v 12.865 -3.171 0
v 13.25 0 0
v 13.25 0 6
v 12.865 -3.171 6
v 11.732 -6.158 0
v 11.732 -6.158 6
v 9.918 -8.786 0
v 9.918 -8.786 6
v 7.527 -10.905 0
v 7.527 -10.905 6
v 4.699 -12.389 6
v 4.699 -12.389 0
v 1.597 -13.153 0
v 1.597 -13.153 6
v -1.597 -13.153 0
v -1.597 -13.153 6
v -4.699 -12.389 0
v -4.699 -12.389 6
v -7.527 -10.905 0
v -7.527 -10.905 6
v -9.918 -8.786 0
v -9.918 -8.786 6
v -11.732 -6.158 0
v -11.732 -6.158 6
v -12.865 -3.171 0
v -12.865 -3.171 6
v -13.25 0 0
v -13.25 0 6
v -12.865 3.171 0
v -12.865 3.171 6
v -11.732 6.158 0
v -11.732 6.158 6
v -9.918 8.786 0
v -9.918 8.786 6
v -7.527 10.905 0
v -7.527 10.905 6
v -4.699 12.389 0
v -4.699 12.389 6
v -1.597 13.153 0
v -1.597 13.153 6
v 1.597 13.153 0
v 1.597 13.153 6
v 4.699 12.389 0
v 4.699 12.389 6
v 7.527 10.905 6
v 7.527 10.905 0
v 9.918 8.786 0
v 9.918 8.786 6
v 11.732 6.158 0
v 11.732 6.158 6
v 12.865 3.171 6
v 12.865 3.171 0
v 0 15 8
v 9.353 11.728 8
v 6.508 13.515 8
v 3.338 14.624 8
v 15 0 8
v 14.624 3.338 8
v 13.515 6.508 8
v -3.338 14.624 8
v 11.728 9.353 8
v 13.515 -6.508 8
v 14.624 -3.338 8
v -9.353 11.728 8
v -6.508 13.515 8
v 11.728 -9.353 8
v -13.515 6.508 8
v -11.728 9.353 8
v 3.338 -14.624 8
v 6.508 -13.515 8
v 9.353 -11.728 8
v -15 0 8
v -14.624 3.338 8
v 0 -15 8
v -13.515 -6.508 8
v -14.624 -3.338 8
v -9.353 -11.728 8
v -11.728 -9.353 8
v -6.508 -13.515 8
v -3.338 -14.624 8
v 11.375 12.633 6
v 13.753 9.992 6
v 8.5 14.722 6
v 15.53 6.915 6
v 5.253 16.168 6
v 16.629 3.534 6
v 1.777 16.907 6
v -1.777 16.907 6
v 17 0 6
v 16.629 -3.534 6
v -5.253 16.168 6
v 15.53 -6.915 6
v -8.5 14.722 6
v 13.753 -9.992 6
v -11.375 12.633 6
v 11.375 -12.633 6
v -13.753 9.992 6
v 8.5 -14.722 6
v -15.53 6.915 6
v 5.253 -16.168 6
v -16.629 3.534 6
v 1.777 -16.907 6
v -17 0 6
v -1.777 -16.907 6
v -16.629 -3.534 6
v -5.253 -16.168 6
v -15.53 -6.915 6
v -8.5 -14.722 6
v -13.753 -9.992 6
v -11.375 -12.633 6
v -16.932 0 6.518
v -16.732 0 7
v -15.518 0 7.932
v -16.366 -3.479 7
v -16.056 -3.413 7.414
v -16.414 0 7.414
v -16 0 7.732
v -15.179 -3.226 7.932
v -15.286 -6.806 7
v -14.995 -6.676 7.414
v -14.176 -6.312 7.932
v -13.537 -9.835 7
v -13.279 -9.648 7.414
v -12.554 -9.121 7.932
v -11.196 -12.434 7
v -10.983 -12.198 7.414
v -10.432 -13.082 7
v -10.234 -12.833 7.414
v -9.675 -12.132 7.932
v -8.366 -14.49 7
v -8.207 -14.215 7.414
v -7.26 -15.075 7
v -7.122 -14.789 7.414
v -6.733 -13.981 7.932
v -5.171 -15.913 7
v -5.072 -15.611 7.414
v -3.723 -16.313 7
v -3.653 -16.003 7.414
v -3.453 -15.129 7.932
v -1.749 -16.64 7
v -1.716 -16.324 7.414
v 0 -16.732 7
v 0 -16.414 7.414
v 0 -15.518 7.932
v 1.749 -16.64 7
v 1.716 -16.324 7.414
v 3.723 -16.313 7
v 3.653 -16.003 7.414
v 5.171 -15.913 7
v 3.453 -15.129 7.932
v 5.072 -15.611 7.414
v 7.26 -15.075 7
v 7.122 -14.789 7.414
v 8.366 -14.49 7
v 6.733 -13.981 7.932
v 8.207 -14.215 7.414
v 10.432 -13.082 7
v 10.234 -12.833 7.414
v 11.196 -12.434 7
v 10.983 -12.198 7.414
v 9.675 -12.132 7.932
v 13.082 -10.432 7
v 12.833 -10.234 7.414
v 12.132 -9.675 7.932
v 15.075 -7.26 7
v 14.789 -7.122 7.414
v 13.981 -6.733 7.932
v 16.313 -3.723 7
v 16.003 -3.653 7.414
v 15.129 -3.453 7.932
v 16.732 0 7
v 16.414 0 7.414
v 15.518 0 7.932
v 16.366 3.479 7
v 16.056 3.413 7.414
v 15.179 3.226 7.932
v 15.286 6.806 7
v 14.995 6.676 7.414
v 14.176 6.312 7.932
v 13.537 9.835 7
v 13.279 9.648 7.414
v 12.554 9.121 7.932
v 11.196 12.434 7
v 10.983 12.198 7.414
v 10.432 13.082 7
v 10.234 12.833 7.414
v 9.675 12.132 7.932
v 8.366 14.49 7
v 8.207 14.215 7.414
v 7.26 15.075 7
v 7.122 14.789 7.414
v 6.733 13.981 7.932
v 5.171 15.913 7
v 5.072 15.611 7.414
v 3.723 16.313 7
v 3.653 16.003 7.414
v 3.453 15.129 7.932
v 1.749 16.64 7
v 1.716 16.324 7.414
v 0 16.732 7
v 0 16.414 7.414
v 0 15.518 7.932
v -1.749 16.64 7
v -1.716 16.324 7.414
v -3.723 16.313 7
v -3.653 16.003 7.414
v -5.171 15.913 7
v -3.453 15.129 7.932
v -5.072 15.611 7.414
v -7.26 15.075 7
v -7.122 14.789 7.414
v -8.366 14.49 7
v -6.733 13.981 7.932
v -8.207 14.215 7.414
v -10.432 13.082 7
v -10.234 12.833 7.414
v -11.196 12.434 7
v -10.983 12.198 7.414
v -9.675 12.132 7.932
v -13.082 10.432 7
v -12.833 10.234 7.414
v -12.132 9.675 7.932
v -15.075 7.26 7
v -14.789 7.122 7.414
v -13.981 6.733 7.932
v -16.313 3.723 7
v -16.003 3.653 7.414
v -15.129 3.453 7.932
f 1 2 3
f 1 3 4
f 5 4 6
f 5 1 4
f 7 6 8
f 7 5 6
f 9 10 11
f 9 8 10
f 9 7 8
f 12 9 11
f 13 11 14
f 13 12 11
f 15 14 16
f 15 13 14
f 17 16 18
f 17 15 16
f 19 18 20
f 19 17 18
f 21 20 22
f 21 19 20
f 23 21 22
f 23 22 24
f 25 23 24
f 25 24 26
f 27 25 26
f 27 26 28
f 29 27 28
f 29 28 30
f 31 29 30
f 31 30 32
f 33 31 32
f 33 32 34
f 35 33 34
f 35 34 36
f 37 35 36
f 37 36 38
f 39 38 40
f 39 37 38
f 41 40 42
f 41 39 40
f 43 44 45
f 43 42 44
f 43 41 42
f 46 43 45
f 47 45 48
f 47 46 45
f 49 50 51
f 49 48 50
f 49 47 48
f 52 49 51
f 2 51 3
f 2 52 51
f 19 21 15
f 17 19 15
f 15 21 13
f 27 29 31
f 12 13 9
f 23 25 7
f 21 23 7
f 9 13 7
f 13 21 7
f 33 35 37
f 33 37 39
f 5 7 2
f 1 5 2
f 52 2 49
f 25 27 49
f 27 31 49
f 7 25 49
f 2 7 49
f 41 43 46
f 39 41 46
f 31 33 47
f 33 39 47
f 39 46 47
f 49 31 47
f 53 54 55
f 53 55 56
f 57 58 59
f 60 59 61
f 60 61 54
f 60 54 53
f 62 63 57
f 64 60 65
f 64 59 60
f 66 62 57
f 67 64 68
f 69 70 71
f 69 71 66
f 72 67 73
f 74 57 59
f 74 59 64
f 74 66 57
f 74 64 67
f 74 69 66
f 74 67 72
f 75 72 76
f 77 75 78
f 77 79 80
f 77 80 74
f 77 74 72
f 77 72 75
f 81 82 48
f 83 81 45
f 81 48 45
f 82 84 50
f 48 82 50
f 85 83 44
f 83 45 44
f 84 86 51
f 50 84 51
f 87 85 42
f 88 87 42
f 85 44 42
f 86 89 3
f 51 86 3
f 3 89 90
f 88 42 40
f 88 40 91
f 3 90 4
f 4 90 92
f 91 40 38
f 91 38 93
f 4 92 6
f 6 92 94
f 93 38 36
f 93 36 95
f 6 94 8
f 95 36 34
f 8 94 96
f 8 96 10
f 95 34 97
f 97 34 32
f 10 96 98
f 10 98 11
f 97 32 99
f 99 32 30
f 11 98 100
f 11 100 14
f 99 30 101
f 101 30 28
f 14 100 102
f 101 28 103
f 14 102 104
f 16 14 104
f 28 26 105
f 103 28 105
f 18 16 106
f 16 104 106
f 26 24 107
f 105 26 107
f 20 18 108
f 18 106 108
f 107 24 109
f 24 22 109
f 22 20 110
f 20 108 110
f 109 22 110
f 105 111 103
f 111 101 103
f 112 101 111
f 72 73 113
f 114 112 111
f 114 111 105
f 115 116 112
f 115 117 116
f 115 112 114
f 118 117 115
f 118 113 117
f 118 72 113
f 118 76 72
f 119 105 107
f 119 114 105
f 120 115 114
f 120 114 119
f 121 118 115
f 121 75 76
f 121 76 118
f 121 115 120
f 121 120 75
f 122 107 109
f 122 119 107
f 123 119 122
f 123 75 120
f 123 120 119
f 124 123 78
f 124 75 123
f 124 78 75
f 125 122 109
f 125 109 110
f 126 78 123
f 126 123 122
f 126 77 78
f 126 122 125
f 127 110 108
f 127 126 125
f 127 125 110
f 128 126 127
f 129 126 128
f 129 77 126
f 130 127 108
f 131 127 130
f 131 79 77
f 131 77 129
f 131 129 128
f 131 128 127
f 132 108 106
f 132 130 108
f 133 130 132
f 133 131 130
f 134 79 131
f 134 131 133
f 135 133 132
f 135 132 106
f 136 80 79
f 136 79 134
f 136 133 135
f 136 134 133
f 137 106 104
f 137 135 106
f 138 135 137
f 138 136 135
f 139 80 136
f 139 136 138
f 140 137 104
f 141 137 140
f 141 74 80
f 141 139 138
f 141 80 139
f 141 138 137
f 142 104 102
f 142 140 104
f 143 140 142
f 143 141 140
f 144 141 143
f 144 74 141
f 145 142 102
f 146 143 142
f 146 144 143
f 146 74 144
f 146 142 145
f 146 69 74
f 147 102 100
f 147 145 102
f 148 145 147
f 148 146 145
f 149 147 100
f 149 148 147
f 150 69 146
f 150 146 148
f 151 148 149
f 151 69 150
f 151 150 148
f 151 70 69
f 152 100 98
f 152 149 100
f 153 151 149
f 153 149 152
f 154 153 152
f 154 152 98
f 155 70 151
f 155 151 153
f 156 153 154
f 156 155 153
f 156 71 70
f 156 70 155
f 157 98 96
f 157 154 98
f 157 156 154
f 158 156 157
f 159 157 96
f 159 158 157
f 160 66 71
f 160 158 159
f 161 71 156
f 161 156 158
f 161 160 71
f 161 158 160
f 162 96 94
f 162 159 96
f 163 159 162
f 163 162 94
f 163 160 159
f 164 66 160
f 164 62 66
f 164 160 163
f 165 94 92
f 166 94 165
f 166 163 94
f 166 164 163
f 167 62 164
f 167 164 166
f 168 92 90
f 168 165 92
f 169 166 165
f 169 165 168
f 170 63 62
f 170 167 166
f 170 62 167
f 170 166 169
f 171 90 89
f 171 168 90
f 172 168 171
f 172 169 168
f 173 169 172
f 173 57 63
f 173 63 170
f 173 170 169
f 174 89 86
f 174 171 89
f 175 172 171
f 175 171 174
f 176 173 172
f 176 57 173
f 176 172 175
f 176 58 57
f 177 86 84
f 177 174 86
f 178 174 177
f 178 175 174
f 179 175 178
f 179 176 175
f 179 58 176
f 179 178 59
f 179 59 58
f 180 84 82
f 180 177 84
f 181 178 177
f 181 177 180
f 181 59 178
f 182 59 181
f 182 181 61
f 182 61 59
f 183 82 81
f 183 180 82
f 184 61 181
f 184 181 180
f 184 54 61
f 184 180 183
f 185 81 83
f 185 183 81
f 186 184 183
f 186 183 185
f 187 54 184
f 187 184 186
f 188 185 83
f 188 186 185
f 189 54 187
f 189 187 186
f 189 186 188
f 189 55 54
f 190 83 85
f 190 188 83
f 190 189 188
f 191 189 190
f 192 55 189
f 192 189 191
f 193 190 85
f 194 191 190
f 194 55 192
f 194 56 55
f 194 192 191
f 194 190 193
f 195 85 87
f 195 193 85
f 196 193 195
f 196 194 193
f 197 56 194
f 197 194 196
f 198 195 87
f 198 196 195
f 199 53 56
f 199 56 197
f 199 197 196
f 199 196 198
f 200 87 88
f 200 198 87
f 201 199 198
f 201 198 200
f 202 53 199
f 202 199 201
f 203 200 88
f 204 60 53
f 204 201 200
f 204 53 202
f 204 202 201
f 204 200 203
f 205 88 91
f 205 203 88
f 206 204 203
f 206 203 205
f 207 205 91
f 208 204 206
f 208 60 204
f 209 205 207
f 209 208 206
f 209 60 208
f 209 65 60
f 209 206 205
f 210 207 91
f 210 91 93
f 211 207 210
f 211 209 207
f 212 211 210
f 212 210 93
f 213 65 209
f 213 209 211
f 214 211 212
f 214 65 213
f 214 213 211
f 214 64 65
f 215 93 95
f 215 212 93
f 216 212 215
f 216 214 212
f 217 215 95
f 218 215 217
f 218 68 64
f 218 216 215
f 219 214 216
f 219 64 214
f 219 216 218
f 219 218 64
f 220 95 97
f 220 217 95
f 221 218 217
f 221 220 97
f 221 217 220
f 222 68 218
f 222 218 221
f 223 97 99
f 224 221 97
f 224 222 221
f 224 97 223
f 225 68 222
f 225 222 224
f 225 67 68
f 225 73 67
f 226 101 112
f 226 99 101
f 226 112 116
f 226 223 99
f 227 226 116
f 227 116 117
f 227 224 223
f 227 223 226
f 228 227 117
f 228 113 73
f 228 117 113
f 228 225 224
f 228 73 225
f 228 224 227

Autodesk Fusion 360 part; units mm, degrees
sketch "Skizze1" plane through (0, 0, 0) normal (0, 0, 1) x (1, 0, 0)
  circle A0 centre (0, 0) radius 13.25
  dimension "d1" = 26.5
extrude "Extrusion1" add sketch "Skizze1" along normal blind 6
sketch "Skizze2" plane through (0, 0, 6) normal (0, 0, 1) x (-1, 0, 0)
  circle A0 centre (0, 0) radius 13.25
  circle A1 centre (0, 0) radius 17
  dimension "d4" = 34
extrude "Extrusion2" add sketch "Skizze2" along normal blind 2 contours A0 | A1
fillet "Abrundung1" radius 2 1 edges at (15.8496, 6.1475, 8)
